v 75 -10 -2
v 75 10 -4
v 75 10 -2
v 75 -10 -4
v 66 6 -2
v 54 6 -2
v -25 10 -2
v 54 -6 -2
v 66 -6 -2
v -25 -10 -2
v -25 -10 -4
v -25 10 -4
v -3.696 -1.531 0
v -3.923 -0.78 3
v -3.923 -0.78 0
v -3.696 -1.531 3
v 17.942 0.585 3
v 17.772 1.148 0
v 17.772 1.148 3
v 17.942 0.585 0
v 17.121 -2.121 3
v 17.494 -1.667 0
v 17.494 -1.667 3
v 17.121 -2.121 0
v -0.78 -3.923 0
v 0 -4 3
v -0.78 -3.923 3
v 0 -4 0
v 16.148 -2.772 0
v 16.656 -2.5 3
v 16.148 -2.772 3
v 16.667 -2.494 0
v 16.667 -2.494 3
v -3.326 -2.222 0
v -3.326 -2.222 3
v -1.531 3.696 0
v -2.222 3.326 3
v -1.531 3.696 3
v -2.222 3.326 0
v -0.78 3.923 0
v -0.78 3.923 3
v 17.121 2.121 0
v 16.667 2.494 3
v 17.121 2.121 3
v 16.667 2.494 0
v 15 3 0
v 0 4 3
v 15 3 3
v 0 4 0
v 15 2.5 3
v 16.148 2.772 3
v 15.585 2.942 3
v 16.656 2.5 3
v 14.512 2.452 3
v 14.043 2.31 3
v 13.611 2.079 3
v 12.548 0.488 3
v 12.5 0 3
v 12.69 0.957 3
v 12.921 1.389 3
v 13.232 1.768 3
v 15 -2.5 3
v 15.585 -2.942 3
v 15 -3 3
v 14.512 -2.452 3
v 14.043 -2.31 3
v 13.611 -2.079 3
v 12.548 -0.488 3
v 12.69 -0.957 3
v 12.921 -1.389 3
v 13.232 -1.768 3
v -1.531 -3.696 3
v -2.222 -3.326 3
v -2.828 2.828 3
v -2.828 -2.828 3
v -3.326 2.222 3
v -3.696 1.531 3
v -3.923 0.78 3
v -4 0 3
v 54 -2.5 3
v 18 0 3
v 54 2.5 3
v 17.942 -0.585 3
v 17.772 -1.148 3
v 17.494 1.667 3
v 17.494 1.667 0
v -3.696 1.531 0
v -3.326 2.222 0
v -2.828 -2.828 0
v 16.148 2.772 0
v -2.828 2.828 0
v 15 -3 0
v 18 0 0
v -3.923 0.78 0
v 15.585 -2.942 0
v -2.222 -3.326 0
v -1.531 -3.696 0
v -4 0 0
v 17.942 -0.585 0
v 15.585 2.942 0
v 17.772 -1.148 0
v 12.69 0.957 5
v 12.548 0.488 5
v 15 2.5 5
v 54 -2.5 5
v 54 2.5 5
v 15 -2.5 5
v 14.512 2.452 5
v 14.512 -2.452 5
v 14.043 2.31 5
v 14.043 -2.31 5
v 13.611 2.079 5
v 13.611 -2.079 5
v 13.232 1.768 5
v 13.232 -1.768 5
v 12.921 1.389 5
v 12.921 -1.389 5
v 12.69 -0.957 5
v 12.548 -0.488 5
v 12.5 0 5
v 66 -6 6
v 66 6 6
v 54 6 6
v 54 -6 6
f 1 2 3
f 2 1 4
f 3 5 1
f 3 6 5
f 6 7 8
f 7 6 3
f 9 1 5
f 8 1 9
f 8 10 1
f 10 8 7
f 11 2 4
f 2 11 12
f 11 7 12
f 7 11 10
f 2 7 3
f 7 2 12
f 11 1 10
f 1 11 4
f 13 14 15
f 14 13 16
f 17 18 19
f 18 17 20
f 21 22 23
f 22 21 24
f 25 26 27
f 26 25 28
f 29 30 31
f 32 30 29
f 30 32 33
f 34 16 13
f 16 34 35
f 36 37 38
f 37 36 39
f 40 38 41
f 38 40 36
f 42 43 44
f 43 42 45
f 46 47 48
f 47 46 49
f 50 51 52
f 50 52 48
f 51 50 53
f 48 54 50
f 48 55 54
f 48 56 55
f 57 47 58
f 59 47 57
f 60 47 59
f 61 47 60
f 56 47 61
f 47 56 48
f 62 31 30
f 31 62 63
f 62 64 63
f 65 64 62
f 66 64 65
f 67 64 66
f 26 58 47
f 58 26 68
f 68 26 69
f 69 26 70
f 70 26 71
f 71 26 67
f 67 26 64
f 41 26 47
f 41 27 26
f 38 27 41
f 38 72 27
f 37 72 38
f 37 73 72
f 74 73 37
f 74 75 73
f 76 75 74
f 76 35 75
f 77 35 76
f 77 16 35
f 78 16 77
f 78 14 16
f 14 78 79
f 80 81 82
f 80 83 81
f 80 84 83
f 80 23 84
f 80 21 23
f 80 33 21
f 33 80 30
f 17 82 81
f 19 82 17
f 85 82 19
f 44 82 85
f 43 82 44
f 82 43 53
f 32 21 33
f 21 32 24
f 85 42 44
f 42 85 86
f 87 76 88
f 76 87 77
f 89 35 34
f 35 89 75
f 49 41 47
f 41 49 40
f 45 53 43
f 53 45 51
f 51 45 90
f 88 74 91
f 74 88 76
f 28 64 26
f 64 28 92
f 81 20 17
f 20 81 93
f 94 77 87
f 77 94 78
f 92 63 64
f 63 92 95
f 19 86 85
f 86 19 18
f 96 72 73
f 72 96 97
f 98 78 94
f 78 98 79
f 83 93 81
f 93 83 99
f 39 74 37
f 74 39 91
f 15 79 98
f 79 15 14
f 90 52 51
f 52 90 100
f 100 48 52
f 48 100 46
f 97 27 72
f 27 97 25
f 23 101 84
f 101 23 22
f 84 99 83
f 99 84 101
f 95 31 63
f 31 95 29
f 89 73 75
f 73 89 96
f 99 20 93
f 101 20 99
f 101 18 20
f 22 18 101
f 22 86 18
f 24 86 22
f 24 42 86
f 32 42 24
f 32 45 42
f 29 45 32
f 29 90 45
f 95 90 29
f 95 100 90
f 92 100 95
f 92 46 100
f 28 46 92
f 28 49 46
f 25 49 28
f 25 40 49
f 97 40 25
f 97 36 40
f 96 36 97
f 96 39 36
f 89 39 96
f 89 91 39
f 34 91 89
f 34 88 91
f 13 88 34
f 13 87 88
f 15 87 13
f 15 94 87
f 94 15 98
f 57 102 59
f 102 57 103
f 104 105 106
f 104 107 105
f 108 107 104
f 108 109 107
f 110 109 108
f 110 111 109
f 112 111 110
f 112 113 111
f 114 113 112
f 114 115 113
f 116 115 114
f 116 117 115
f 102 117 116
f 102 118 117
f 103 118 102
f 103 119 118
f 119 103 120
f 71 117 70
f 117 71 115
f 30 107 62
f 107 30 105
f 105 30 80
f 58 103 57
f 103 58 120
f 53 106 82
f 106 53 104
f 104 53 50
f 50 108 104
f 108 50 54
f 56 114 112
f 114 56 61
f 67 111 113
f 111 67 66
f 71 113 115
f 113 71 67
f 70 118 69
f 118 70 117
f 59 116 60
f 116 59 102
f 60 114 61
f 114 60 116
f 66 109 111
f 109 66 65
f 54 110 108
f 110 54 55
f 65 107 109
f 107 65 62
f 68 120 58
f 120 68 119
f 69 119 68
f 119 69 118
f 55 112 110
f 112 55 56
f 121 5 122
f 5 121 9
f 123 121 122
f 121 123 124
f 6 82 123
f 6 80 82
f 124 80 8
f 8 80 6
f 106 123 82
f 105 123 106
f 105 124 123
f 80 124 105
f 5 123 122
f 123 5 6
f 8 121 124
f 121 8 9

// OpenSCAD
// Animated example: a crank driving a slider. Press "Animate" in the preview,
// or ask your agent to "check the mechanism at t = 0.25 and 0.75".

/* [Mechanism] */
// Crank radius (mm)
crank = 15; // [5:40]
// Connecting rod length (mm)
rod = 45; // [30:100]

/* [Hidden] */
$fn = 32;
angle = 360 * $t;

crank_pin = [crank * cos(angle), crank * sin(angle)];
slider_x = crank * cos(angle) + sqrt(rod * rod - pow(crank * sin(angle), 2));

// Base plate
translate([-crank - 10, -10, -4]) cube([crank + rod + 40, 20, 2]);
// Crank
color("SteelBlue") hull() {
  cylinder(r = 4, h = 3);
  translate(crank_pin) cylinder(r = 3, h = 3);
}
// Connecting rod
color("Orange") translate([0, 0, 3]) hull() {
  translate(crank_pin) cylinder(r = 2.5, h = 2);
  translate([slider_x, 0]) cylinder(r = 2.5, h = 2);
}
// Slider block
color("Tomato") translate([slider_x - 6, -6, -2]) cube([12, 12, 8]);
